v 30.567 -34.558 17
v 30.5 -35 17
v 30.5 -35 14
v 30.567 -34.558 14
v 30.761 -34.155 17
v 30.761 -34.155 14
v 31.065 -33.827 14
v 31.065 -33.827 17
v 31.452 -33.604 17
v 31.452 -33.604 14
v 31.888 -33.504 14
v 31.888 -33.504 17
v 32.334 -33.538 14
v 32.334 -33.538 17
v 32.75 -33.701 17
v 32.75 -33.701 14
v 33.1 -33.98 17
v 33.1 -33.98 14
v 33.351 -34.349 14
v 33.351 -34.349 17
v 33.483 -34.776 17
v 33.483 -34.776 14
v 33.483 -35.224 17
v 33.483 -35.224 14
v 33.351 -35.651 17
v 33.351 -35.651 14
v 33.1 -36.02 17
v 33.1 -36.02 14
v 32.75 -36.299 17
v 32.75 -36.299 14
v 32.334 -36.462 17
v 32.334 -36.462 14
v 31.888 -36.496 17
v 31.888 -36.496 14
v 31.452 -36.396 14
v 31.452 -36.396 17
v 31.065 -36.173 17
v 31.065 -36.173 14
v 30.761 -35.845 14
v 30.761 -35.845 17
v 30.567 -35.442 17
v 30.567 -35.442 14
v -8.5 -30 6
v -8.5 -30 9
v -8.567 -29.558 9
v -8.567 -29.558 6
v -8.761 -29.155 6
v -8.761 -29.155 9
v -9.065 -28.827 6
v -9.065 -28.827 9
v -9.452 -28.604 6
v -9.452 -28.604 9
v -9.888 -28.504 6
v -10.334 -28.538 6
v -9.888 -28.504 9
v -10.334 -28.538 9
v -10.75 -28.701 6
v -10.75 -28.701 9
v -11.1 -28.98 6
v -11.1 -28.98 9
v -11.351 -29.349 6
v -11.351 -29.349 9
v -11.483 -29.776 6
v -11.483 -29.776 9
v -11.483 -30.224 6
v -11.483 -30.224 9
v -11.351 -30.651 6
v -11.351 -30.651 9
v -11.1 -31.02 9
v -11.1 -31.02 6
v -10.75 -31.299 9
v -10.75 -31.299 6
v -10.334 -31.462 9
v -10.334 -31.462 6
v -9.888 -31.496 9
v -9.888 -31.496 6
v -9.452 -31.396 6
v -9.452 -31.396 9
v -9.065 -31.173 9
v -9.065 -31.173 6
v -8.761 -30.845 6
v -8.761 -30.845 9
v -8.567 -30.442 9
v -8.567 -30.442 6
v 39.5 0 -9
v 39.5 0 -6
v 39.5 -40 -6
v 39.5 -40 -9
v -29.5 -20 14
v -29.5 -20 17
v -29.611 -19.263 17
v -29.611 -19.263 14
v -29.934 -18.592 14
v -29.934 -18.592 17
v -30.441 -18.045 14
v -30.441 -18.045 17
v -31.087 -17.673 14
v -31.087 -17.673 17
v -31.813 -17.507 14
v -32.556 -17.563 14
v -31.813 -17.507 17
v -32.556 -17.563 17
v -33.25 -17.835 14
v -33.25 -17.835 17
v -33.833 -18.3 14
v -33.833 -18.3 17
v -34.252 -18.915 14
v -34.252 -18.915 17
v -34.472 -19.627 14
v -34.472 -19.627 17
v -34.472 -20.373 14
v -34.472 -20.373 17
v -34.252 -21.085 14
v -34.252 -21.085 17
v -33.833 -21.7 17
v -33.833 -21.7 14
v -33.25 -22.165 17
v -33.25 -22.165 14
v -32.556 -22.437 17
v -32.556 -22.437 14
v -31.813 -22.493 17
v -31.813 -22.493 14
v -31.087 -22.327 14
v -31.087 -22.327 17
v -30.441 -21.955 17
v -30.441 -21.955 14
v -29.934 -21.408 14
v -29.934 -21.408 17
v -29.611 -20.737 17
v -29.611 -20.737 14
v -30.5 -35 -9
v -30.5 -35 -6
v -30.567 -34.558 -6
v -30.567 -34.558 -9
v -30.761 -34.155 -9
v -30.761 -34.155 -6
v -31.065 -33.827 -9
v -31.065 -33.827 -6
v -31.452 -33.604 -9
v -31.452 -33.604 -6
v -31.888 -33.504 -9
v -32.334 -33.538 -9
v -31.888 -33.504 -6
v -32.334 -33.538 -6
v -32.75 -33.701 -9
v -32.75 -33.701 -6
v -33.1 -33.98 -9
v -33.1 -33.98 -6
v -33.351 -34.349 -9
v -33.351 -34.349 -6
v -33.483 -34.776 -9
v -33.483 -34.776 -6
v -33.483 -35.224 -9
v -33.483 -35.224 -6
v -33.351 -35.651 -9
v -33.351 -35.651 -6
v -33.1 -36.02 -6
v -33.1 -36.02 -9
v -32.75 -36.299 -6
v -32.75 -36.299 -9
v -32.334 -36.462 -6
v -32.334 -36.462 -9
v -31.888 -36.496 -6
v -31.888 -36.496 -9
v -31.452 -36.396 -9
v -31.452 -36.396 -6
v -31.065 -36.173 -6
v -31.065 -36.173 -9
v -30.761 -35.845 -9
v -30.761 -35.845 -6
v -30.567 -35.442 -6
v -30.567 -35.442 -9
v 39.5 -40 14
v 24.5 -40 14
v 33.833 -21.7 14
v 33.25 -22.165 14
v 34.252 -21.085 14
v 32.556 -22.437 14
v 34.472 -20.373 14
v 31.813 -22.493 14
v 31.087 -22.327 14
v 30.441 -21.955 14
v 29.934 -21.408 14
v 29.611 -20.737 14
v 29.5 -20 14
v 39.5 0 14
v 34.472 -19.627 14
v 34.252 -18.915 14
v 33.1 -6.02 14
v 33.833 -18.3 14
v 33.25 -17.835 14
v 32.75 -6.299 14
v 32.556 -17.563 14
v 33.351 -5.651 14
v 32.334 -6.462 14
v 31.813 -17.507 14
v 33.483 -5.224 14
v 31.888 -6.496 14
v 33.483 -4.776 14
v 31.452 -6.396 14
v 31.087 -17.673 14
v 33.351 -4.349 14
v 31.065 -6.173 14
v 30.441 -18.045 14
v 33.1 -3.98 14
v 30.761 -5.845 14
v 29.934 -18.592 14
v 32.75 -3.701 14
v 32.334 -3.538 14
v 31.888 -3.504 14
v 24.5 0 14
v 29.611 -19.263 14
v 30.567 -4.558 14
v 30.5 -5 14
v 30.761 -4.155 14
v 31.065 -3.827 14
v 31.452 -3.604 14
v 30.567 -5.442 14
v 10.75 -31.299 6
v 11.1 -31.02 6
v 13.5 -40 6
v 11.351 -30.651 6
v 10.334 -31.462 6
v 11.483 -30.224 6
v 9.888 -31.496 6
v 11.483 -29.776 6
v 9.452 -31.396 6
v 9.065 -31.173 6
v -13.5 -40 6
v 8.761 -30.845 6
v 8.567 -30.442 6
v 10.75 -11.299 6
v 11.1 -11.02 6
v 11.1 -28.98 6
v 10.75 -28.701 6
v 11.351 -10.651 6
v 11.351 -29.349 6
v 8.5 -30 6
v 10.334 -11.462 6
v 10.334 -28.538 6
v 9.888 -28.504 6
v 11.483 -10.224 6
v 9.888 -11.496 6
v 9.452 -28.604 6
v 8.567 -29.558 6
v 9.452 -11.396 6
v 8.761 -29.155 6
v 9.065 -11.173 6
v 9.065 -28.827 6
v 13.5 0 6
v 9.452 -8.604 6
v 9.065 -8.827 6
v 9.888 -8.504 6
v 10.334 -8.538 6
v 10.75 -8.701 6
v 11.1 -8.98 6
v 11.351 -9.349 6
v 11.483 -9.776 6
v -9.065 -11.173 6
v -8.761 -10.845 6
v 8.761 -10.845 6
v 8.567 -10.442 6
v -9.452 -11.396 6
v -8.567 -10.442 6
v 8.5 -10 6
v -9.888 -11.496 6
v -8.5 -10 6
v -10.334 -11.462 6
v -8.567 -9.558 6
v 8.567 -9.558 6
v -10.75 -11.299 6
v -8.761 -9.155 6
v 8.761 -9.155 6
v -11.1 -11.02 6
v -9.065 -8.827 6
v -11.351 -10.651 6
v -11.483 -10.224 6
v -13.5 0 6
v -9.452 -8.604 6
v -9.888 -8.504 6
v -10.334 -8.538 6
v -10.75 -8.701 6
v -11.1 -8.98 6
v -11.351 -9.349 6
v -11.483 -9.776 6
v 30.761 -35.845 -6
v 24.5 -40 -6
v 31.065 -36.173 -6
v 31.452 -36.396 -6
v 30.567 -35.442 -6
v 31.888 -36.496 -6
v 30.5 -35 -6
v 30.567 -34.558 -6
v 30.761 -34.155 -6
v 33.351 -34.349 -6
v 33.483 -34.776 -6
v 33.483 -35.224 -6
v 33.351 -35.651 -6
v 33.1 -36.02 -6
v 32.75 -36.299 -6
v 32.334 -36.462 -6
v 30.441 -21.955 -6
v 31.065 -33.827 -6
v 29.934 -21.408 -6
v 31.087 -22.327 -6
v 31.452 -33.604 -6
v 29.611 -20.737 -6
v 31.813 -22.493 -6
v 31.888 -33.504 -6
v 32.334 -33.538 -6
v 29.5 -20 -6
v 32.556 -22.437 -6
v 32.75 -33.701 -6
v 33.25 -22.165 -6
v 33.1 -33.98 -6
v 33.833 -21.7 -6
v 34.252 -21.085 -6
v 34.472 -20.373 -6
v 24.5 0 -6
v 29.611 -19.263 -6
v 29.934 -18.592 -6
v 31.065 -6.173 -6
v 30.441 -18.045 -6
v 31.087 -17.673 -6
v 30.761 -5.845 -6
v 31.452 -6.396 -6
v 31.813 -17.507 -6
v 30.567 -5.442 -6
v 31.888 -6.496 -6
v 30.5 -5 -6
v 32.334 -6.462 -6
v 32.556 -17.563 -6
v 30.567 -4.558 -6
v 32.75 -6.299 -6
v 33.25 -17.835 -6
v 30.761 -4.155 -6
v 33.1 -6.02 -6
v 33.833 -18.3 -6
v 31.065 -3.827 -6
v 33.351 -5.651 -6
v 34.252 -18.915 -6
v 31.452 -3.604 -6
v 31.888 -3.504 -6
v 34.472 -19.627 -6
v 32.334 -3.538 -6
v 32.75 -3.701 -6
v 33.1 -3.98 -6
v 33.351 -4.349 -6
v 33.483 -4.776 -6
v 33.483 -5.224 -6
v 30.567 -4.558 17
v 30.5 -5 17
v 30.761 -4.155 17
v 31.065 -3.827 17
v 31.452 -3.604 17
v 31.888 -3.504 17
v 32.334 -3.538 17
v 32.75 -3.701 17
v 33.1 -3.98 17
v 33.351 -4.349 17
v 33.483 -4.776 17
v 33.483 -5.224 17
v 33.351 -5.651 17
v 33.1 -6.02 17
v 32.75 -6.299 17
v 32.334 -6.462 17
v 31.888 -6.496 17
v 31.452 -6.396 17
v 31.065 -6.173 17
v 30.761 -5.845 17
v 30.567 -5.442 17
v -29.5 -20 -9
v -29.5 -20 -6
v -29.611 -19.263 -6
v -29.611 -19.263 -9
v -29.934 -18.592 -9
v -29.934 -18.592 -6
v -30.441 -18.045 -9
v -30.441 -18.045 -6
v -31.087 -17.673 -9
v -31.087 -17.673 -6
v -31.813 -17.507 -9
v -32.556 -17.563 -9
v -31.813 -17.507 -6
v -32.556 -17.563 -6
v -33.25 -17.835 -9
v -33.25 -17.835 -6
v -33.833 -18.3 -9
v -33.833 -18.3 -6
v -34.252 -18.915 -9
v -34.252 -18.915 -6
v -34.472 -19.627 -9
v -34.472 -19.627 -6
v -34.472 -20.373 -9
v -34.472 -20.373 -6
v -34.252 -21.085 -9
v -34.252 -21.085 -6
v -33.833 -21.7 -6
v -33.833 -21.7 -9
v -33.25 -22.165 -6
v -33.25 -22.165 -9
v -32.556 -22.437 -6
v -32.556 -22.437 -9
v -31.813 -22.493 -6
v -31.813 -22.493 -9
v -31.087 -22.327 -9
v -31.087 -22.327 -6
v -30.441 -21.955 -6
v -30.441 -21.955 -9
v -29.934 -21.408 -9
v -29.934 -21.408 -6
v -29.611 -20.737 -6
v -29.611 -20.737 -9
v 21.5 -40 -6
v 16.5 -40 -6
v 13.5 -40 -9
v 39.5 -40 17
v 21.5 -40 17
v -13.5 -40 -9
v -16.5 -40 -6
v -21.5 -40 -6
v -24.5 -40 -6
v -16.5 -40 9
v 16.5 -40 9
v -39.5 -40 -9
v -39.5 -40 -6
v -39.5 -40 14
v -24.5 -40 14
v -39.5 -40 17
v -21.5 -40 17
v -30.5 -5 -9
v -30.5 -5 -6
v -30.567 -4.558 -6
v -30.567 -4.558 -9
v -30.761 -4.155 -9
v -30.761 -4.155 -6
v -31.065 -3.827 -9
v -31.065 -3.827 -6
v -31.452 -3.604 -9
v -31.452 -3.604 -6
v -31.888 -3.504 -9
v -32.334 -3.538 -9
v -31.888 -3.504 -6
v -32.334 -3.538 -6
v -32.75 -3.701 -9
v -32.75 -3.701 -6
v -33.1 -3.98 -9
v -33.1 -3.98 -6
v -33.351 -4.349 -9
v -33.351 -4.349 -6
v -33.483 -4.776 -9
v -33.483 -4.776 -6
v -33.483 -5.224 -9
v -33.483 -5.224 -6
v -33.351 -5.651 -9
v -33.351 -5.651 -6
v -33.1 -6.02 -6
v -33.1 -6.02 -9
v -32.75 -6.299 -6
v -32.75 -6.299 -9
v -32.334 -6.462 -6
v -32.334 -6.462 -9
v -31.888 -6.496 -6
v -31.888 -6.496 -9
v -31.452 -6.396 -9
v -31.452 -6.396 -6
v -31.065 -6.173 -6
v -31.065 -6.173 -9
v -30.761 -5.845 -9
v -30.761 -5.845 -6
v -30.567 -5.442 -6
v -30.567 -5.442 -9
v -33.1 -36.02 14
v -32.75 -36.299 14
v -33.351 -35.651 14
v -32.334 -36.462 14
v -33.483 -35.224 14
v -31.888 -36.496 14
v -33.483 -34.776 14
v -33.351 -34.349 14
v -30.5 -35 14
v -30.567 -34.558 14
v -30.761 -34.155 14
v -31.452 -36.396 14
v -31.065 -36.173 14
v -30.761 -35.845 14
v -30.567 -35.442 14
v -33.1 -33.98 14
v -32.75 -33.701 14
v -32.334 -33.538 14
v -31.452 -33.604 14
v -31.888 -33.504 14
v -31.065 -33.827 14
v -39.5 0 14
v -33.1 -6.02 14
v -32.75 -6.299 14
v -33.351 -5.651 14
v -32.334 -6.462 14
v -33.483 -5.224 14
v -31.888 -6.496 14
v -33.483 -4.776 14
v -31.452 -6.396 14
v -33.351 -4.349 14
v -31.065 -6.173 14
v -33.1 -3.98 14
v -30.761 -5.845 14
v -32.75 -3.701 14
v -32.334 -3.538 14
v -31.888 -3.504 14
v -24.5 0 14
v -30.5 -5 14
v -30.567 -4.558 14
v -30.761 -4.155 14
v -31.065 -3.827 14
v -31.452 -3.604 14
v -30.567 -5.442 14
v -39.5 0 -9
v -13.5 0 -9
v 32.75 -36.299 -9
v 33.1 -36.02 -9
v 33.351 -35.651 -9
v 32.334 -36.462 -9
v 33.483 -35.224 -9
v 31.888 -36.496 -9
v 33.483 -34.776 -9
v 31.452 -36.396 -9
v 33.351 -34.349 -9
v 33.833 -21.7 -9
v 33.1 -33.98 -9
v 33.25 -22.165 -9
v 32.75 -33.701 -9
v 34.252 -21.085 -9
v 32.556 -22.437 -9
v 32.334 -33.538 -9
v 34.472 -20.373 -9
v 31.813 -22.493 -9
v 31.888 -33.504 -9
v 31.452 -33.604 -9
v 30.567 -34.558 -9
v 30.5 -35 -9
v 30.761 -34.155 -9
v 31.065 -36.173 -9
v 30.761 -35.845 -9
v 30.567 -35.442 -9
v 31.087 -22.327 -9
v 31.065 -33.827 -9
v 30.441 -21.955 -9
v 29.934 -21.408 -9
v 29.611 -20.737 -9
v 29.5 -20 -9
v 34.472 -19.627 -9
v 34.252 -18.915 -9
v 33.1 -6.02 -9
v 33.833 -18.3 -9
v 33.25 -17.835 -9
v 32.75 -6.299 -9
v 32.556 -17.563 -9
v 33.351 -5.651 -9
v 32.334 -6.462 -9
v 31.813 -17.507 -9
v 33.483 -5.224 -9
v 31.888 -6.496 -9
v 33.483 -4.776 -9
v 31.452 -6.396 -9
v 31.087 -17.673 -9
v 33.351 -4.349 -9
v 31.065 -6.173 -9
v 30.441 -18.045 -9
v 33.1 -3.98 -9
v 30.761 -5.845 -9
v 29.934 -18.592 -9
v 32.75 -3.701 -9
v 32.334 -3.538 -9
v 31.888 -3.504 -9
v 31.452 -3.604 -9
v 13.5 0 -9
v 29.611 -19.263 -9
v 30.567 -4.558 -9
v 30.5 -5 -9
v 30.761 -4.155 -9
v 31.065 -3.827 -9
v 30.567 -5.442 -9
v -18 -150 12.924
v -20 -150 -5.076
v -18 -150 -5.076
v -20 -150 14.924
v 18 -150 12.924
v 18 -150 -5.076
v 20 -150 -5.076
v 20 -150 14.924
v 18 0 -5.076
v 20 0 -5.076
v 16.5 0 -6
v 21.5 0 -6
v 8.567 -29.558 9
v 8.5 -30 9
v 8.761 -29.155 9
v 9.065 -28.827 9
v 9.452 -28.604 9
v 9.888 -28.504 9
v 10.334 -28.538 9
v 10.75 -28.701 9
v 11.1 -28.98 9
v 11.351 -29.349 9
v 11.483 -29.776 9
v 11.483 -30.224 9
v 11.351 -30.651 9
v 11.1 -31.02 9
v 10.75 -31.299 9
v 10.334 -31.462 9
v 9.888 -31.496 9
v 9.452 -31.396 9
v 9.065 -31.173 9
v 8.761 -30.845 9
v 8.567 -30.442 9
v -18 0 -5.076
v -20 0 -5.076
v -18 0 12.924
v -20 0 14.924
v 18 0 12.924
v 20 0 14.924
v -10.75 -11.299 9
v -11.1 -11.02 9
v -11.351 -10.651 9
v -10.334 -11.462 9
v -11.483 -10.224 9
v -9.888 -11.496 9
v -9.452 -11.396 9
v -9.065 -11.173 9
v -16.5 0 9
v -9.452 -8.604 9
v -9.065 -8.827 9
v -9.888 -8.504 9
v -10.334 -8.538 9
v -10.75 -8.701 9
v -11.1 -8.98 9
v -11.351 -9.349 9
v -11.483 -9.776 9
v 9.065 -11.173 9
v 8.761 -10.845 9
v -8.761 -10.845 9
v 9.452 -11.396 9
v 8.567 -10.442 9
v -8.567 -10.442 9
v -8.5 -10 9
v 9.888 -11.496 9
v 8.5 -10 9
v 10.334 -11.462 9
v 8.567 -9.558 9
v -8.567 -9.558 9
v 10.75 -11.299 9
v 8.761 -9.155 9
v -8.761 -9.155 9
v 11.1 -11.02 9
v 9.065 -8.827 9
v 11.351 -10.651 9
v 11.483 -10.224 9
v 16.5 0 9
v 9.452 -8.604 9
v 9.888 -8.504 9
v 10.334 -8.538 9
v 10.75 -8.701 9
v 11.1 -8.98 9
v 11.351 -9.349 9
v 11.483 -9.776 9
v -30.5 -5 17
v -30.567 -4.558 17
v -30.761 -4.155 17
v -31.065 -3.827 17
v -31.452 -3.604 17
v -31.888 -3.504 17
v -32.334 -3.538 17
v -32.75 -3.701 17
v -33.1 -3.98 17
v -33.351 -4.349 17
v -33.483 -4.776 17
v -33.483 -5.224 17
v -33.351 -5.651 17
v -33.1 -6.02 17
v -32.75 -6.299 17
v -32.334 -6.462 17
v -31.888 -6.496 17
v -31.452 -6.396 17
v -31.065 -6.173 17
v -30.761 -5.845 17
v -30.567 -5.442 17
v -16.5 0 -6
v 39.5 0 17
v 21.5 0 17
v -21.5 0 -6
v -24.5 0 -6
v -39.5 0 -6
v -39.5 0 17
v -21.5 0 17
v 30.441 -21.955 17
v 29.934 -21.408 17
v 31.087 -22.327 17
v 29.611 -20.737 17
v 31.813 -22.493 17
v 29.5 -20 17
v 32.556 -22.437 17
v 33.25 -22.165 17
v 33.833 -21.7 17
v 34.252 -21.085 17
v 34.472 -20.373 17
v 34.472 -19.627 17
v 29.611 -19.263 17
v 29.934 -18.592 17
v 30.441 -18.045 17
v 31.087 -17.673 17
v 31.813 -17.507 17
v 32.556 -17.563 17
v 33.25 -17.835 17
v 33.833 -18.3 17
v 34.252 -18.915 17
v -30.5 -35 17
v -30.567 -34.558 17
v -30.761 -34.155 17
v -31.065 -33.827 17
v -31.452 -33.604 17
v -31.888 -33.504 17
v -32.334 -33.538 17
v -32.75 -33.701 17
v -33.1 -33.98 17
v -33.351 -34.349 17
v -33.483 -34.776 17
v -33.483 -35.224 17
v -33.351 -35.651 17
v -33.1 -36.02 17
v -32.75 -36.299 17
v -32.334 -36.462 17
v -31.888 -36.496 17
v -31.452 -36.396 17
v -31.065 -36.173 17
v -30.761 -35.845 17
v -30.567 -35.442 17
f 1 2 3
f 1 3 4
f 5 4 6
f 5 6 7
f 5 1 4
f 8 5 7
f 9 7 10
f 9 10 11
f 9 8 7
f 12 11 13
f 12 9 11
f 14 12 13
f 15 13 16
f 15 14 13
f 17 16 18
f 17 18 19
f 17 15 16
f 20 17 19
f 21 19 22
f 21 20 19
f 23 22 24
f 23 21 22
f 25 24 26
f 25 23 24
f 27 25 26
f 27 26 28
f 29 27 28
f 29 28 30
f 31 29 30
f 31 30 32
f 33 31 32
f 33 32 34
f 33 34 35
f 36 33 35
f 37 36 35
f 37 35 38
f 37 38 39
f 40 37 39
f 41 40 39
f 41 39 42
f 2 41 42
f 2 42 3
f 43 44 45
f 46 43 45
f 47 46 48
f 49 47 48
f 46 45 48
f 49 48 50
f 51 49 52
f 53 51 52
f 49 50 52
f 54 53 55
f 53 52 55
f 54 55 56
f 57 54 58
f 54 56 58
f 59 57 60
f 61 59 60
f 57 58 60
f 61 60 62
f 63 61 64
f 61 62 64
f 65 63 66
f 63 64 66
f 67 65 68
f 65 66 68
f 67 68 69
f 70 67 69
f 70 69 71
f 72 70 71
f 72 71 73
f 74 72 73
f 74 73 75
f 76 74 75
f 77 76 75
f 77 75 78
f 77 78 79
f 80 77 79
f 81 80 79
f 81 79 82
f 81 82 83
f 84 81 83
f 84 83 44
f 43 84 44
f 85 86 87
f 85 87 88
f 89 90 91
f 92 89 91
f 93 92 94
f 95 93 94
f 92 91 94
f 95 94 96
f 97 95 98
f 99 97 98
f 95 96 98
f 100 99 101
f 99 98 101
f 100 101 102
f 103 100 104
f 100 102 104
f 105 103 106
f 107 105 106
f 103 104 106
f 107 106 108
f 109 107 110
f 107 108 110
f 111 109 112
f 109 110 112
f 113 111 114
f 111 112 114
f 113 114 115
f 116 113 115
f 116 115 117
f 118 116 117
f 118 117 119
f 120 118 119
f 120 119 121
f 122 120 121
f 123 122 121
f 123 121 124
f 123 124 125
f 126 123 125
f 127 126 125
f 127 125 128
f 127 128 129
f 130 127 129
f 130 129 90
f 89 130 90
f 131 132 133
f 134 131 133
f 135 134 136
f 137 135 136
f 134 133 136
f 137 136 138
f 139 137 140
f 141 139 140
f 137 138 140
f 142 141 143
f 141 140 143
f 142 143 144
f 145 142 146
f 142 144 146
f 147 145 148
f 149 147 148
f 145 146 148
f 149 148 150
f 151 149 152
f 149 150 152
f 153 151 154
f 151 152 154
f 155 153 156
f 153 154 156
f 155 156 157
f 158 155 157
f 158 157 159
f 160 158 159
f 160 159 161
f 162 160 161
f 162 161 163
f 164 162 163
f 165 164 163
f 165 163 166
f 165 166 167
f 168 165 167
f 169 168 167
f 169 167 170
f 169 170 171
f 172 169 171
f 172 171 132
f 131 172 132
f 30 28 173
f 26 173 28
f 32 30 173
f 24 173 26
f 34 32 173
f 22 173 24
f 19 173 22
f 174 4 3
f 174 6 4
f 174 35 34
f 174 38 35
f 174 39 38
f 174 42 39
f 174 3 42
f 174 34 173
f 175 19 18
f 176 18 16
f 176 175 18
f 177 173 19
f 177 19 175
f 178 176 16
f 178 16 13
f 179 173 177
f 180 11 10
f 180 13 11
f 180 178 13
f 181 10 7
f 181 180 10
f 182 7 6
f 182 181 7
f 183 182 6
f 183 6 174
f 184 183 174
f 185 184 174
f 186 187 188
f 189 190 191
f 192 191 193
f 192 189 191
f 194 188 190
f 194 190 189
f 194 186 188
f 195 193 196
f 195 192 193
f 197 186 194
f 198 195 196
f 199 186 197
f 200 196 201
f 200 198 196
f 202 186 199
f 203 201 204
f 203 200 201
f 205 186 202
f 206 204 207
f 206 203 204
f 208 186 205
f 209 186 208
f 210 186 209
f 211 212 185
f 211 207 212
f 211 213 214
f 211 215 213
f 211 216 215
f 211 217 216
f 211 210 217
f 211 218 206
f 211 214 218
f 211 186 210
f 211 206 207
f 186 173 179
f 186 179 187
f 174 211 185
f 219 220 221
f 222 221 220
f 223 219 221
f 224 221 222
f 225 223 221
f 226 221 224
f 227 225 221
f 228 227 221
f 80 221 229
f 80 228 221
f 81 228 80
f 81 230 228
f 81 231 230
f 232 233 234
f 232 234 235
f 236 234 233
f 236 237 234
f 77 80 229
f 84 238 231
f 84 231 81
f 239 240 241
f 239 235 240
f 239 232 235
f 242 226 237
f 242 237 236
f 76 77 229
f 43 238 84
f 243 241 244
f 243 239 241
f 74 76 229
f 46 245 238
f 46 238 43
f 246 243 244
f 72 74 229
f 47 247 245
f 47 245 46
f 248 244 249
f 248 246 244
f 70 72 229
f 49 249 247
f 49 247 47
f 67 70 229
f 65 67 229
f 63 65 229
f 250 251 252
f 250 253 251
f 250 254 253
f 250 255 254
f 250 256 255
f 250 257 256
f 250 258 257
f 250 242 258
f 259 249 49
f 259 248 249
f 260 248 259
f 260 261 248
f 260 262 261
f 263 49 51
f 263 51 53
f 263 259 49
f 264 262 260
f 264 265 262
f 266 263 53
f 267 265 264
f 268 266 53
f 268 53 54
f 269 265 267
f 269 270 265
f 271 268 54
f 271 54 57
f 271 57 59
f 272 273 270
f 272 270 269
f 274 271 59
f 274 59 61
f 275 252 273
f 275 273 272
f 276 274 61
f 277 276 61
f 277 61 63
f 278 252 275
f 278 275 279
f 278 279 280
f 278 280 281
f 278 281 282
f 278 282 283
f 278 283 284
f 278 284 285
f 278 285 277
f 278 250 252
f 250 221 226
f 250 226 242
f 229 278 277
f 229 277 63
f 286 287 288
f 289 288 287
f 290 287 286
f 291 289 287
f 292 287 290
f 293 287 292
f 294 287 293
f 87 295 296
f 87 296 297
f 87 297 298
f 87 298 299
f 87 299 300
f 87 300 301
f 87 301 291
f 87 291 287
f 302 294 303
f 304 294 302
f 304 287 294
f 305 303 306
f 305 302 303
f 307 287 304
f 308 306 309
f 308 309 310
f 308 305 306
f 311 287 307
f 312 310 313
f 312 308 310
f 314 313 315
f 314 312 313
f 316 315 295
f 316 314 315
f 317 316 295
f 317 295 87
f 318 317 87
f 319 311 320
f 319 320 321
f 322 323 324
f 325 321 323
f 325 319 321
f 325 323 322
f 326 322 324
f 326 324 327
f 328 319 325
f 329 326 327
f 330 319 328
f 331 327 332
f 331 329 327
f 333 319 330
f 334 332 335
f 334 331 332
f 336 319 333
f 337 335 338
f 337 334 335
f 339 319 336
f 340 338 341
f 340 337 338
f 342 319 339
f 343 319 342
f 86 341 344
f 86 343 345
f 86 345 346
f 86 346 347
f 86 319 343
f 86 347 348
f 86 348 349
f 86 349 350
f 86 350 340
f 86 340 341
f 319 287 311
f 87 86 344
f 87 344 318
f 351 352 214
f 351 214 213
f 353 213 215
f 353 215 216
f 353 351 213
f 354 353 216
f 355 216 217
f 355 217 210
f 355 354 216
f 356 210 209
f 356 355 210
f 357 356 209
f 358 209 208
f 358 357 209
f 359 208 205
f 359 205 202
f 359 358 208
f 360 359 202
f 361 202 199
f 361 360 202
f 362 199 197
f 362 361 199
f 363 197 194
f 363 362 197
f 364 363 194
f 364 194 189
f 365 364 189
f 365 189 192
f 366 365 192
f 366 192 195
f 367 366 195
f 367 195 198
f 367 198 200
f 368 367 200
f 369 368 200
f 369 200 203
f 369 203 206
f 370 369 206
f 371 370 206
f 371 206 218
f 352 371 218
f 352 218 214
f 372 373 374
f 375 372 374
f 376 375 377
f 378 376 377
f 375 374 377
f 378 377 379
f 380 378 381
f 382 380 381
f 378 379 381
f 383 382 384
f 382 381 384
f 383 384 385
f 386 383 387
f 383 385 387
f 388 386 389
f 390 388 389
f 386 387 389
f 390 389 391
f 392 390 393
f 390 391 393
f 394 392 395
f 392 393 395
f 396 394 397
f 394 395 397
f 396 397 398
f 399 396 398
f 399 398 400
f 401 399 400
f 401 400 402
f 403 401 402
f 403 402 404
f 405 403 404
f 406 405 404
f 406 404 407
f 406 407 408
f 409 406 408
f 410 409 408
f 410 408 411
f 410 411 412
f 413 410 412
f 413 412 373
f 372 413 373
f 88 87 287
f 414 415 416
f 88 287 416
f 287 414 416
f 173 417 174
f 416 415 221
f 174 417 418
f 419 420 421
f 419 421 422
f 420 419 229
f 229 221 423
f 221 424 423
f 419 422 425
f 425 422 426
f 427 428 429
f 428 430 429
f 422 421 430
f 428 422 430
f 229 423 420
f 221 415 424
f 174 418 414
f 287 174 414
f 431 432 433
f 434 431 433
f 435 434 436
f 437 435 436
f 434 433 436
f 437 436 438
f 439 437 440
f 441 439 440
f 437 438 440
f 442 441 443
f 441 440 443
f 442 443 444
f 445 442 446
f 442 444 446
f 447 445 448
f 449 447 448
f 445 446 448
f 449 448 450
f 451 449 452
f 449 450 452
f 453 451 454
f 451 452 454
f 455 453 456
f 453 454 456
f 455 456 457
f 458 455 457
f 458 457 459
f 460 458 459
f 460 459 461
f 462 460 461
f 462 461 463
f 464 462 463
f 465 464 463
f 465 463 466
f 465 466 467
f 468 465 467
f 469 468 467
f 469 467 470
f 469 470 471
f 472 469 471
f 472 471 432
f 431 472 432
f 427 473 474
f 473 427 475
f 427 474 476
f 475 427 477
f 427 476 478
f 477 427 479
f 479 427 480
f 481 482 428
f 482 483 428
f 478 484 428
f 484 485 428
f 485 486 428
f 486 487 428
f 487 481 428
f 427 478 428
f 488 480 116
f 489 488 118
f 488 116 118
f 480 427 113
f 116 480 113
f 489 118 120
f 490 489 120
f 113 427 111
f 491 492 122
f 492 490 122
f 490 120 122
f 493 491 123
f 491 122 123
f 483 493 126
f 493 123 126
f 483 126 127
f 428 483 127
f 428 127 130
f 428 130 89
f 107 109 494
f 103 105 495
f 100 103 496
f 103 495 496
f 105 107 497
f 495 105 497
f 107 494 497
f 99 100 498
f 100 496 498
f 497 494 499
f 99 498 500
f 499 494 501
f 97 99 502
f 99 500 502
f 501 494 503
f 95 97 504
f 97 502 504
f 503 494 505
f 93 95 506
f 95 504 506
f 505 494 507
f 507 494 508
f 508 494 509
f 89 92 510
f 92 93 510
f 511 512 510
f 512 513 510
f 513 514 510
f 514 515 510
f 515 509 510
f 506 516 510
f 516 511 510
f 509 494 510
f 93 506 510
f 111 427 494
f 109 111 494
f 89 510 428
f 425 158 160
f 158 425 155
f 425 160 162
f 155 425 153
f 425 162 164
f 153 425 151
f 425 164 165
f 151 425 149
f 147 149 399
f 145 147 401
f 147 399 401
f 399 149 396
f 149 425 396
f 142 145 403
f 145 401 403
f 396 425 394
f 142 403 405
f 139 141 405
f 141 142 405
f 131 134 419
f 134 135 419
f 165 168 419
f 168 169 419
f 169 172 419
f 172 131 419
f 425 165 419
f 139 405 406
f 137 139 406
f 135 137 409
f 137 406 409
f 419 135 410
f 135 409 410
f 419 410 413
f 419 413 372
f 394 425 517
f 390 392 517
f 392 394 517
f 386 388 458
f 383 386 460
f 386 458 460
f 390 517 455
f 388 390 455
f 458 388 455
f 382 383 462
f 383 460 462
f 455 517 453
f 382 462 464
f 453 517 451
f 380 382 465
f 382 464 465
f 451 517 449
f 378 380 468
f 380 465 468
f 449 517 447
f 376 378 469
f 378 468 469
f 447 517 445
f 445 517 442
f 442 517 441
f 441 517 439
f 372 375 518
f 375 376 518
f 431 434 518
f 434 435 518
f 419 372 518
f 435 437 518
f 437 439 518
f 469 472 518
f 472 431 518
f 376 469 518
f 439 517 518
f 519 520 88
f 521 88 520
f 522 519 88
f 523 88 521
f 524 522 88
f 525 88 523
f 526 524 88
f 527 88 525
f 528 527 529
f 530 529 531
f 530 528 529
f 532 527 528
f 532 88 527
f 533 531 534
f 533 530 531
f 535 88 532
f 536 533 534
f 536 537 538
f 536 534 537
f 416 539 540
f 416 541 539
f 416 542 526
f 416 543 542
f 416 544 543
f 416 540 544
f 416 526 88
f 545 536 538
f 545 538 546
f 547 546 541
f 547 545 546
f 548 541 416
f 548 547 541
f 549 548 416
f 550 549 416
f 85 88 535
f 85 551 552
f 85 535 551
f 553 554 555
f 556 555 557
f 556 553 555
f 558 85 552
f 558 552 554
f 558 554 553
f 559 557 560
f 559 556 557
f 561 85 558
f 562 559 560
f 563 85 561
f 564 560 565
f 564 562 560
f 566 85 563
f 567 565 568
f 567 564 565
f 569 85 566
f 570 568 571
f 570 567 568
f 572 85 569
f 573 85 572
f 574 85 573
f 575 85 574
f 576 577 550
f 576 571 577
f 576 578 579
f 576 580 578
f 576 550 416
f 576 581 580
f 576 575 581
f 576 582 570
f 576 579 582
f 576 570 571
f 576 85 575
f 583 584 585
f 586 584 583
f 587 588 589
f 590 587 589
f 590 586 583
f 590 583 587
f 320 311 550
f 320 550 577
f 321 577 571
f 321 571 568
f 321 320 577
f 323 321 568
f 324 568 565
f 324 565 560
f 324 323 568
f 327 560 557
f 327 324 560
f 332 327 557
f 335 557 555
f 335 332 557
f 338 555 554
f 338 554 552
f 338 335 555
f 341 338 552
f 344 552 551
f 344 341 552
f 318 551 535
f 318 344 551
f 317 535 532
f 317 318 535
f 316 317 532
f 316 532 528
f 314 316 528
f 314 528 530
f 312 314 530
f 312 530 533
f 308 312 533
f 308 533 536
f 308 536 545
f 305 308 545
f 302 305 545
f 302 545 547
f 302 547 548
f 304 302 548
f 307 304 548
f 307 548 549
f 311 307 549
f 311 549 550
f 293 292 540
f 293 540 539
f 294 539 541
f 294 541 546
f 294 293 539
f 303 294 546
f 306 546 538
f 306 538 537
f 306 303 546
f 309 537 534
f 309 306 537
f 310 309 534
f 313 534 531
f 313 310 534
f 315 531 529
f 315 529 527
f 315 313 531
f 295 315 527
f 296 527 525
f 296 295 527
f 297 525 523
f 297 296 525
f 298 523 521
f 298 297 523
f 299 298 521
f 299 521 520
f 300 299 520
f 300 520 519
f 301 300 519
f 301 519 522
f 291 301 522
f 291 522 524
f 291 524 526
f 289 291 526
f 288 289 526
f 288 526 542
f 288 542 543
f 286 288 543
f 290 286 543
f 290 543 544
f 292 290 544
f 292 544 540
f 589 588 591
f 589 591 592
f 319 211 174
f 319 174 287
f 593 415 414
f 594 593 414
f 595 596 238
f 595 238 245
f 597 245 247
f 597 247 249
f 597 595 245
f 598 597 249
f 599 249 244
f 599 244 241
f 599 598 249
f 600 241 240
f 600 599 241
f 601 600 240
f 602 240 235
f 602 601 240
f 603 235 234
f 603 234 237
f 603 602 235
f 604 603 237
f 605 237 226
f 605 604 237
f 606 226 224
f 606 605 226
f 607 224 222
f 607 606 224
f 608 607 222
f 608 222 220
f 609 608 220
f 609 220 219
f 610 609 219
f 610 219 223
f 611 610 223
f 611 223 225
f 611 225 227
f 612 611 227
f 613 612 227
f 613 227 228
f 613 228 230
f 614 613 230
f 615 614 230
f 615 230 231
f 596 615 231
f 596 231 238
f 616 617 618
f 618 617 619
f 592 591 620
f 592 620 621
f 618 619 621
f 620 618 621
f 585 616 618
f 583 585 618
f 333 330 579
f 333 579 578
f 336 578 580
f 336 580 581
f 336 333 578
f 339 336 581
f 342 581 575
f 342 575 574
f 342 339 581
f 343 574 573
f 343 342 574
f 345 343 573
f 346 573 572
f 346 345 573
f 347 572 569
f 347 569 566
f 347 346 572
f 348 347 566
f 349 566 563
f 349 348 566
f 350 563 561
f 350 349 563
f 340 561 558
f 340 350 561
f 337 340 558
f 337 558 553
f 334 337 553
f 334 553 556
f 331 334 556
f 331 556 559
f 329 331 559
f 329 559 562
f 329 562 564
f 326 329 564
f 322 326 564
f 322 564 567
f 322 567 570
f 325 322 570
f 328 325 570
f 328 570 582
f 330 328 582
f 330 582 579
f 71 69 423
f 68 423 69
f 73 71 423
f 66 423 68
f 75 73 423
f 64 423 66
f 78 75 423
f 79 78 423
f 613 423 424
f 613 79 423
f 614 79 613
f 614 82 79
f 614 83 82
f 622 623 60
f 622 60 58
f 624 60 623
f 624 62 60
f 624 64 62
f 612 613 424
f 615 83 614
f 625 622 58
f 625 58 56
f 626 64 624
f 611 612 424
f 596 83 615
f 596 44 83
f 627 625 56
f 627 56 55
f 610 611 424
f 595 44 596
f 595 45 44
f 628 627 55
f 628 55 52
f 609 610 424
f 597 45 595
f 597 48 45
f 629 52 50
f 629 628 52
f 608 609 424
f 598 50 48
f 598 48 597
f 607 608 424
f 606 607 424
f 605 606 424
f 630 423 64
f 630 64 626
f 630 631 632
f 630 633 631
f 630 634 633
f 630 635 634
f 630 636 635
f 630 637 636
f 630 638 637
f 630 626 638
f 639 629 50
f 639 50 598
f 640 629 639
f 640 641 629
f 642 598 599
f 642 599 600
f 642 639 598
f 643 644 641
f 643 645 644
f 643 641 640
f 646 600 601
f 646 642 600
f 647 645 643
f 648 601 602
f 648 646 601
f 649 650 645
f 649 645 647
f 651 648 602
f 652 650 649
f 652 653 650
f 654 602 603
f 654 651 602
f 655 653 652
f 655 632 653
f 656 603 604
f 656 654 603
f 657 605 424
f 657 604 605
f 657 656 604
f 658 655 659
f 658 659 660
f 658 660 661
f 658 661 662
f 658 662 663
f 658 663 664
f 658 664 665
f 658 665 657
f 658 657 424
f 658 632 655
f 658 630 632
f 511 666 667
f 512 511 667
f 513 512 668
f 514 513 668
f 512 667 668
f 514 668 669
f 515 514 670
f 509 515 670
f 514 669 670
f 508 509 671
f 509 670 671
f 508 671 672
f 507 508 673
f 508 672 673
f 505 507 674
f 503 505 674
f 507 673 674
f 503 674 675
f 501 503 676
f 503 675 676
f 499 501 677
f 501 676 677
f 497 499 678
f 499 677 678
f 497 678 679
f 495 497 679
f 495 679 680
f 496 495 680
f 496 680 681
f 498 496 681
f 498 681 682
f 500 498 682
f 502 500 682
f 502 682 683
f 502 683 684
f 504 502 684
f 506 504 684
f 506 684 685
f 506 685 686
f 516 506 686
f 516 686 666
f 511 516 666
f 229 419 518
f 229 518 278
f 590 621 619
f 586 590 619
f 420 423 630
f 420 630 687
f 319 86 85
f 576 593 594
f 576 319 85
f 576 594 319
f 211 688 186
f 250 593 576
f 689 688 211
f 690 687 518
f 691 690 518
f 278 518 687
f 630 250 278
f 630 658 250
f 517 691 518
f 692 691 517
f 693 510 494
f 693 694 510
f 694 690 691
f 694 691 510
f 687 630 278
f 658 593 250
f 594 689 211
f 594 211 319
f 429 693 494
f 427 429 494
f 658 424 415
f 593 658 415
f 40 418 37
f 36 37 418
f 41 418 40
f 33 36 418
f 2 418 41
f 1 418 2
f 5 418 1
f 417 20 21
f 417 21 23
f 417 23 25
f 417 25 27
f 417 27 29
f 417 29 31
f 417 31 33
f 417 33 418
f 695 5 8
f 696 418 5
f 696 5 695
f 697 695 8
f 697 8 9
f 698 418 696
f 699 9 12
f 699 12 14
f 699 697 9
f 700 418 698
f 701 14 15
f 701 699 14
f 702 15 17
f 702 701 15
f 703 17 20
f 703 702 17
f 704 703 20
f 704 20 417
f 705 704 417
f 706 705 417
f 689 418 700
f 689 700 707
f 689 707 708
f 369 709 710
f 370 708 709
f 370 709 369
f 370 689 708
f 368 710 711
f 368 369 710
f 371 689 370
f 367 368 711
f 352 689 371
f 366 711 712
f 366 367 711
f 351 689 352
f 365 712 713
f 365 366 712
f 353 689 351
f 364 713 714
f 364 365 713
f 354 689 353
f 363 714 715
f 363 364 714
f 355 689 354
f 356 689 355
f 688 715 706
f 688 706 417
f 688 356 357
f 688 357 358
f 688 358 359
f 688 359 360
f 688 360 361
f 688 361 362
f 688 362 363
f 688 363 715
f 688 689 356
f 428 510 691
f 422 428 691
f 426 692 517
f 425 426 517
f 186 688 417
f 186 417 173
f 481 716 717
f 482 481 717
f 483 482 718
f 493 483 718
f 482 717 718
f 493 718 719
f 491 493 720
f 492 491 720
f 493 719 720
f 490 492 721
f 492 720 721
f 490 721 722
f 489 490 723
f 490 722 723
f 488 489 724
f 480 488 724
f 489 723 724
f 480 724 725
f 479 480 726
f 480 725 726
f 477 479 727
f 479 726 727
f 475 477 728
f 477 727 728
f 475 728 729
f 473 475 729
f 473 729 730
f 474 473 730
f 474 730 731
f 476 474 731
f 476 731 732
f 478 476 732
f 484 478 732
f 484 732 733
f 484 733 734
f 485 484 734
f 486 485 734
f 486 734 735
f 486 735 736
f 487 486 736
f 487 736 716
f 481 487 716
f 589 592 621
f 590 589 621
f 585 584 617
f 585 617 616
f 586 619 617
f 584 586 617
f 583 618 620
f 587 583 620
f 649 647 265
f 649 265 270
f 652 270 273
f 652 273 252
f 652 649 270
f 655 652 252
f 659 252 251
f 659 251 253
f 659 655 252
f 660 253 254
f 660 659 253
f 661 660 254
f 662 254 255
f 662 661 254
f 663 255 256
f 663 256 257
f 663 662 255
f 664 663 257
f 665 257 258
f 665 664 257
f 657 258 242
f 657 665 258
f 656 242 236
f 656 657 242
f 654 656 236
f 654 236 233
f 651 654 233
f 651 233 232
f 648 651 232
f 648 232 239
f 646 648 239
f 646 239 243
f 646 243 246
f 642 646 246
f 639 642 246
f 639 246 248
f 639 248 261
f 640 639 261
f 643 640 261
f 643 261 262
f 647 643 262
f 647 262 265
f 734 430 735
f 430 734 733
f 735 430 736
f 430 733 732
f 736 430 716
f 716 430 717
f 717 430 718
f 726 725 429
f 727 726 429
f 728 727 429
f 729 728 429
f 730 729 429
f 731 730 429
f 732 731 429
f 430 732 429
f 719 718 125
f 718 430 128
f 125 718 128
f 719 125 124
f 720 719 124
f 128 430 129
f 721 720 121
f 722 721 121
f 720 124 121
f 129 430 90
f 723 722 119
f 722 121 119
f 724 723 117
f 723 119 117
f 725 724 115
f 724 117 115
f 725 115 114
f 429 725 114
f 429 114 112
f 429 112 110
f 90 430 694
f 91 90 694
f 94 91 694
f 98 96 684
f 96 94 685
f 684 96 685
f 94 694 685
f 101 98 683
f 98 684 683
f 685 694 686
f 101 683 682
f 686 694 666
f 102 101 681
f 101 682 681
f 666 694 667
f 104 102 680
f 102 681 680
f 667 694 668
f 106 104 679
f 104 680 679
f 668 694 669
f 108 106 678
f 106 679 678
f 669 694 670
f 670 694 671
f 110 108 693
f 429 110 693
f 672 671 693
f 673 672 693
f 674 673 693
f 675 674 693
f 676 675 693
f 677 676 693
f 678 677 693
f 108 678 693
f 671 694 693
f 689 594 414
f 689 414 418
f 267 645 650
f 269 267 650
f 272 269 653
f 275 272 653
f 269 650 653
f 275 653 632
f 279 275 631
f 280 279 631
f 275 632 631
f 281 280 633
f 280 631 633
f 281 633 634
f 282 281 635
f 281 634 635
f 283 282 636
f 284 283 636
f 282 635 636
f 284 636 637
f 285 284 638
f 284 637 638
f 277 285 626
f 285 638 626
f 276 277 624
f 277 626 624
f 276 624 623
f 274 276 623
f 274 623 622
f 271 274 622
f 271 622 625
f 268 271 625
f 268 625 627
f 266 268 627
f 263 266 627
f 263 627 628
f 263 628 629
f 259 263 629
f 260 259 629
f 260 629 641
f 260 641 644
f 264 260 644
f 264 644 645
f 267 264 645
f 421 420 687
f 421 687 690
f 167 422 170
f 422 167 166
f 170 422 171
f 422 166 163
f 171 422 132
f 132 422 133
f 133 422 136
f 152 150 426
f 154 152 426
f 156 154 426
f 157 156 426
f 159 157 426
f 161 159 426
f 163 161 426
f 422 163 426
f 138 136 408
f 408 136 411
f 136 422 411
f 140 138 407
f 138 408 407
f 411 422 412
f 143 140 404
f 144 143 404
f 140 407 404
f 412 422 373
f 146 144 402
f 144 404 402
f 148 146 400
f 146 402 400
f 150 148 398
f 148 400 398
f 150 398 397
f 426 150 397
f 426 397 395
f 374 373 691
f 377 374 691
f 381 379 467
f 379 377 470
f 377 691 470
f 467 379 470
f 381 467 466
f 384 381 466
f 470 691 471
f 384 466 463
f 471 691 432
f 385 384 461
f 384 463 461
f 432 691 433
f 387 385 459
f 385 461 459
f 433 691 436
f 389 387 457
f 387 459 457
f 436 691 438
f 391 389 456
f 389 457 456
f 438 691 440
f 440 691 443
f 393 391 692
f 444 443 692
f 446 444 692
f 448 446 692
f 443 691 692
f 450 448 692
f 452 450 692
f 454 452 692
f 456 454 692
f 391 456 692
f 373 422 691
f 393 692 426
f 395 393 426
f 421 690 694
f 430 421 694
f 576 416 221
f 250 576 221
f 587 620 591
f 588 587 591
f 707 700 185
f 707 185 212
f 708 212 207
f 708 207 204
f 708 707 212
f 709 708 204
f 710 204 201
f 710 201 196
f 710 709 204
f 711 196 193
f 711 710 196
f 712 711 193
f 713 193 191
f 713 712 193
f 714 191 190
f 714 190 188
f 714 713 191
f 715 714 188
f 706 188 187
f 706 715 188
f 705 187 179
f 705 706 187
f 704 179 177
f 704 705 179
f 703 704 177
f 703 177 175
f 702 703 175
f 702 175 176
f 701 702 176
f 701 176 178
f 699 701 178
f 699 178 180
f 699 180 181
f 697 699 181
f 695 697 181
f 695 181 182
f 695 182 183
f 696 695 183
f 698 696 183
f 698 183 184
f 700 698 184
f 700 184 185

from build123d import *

# Parameters (mm, degrees)
F1_DEPTH = 40
F2_R     = 1.5
F3_DEPTH = 18.001
F4_R     = 1.5
F4_R_2   = 2.5
F5_DEPTH = 26.001
F7_DEPTH = 150


with BuildPart() as f1:
    # F0 (on Front) → F1 (new body)
    with BuildSketch(Plane.XZ):
        Polygon((-13.5, -9), (-13.5, 6), (0, 6), (0, 9), (-16.5, 9), (-16.5, -6), (-21.5, -6), (-21.5, 17), (-39.5, 17), (-39.5, 14), (-24.5, 14), (-24.5, -6), (-39.5, -6), (-39.5, -9), (-24.5, -9), align=None)
    extrude(amount=F1_DEPTH)

    # F2 (on face) → F3 (cut, through all)
    with BuildSketch(Plane.XY.offset(9)):
        with Locations((-10, -10)):
            Circle(F2_R)
        with Locations((-10, -30)):
            Circle(F2_R)
    extrude(amount=-F3_DEPTH, mode=Mode.SUBTRACT)

    # F4 (on face) → F5 (cut, through all)
    with BuildSketch(Plane.XY.offset(17)):
        with Locations((-32, -35)):
            Circle(F4_R)
        with Locations((-32, -5)):
            Circle(F4_R)
        with Locations((-32, -20)):
            Circle(F4_R_2)
    extrude(amount=-F5_DEPTH, mode=Mode.SUBTRACT)

    # F6: F1 across face


with BuildPart() as f1_1:
    add(f1.part)
    add(f1.part.mirror(Plane(origin=(0, -20, 7.5), x_dir=(0, 1, 0), z_dir=(1, 0, 0))))


with BuildPart() as f7:
    # F0 (on Front) → F7 (new body)
    with BuildSketch(Plane.XZ):
        Polygon((-20, 14.924206), (-20, -5.075794), (-18, -5.075794), (-18, 12.924206), (18, 12.924206), (18, -5.075794), (20, -5.075794), (20, 14.924206), align=None)
    extrude(amount=F7_DEPTH)


solid = Compound([f1_1.part, f7.part])
